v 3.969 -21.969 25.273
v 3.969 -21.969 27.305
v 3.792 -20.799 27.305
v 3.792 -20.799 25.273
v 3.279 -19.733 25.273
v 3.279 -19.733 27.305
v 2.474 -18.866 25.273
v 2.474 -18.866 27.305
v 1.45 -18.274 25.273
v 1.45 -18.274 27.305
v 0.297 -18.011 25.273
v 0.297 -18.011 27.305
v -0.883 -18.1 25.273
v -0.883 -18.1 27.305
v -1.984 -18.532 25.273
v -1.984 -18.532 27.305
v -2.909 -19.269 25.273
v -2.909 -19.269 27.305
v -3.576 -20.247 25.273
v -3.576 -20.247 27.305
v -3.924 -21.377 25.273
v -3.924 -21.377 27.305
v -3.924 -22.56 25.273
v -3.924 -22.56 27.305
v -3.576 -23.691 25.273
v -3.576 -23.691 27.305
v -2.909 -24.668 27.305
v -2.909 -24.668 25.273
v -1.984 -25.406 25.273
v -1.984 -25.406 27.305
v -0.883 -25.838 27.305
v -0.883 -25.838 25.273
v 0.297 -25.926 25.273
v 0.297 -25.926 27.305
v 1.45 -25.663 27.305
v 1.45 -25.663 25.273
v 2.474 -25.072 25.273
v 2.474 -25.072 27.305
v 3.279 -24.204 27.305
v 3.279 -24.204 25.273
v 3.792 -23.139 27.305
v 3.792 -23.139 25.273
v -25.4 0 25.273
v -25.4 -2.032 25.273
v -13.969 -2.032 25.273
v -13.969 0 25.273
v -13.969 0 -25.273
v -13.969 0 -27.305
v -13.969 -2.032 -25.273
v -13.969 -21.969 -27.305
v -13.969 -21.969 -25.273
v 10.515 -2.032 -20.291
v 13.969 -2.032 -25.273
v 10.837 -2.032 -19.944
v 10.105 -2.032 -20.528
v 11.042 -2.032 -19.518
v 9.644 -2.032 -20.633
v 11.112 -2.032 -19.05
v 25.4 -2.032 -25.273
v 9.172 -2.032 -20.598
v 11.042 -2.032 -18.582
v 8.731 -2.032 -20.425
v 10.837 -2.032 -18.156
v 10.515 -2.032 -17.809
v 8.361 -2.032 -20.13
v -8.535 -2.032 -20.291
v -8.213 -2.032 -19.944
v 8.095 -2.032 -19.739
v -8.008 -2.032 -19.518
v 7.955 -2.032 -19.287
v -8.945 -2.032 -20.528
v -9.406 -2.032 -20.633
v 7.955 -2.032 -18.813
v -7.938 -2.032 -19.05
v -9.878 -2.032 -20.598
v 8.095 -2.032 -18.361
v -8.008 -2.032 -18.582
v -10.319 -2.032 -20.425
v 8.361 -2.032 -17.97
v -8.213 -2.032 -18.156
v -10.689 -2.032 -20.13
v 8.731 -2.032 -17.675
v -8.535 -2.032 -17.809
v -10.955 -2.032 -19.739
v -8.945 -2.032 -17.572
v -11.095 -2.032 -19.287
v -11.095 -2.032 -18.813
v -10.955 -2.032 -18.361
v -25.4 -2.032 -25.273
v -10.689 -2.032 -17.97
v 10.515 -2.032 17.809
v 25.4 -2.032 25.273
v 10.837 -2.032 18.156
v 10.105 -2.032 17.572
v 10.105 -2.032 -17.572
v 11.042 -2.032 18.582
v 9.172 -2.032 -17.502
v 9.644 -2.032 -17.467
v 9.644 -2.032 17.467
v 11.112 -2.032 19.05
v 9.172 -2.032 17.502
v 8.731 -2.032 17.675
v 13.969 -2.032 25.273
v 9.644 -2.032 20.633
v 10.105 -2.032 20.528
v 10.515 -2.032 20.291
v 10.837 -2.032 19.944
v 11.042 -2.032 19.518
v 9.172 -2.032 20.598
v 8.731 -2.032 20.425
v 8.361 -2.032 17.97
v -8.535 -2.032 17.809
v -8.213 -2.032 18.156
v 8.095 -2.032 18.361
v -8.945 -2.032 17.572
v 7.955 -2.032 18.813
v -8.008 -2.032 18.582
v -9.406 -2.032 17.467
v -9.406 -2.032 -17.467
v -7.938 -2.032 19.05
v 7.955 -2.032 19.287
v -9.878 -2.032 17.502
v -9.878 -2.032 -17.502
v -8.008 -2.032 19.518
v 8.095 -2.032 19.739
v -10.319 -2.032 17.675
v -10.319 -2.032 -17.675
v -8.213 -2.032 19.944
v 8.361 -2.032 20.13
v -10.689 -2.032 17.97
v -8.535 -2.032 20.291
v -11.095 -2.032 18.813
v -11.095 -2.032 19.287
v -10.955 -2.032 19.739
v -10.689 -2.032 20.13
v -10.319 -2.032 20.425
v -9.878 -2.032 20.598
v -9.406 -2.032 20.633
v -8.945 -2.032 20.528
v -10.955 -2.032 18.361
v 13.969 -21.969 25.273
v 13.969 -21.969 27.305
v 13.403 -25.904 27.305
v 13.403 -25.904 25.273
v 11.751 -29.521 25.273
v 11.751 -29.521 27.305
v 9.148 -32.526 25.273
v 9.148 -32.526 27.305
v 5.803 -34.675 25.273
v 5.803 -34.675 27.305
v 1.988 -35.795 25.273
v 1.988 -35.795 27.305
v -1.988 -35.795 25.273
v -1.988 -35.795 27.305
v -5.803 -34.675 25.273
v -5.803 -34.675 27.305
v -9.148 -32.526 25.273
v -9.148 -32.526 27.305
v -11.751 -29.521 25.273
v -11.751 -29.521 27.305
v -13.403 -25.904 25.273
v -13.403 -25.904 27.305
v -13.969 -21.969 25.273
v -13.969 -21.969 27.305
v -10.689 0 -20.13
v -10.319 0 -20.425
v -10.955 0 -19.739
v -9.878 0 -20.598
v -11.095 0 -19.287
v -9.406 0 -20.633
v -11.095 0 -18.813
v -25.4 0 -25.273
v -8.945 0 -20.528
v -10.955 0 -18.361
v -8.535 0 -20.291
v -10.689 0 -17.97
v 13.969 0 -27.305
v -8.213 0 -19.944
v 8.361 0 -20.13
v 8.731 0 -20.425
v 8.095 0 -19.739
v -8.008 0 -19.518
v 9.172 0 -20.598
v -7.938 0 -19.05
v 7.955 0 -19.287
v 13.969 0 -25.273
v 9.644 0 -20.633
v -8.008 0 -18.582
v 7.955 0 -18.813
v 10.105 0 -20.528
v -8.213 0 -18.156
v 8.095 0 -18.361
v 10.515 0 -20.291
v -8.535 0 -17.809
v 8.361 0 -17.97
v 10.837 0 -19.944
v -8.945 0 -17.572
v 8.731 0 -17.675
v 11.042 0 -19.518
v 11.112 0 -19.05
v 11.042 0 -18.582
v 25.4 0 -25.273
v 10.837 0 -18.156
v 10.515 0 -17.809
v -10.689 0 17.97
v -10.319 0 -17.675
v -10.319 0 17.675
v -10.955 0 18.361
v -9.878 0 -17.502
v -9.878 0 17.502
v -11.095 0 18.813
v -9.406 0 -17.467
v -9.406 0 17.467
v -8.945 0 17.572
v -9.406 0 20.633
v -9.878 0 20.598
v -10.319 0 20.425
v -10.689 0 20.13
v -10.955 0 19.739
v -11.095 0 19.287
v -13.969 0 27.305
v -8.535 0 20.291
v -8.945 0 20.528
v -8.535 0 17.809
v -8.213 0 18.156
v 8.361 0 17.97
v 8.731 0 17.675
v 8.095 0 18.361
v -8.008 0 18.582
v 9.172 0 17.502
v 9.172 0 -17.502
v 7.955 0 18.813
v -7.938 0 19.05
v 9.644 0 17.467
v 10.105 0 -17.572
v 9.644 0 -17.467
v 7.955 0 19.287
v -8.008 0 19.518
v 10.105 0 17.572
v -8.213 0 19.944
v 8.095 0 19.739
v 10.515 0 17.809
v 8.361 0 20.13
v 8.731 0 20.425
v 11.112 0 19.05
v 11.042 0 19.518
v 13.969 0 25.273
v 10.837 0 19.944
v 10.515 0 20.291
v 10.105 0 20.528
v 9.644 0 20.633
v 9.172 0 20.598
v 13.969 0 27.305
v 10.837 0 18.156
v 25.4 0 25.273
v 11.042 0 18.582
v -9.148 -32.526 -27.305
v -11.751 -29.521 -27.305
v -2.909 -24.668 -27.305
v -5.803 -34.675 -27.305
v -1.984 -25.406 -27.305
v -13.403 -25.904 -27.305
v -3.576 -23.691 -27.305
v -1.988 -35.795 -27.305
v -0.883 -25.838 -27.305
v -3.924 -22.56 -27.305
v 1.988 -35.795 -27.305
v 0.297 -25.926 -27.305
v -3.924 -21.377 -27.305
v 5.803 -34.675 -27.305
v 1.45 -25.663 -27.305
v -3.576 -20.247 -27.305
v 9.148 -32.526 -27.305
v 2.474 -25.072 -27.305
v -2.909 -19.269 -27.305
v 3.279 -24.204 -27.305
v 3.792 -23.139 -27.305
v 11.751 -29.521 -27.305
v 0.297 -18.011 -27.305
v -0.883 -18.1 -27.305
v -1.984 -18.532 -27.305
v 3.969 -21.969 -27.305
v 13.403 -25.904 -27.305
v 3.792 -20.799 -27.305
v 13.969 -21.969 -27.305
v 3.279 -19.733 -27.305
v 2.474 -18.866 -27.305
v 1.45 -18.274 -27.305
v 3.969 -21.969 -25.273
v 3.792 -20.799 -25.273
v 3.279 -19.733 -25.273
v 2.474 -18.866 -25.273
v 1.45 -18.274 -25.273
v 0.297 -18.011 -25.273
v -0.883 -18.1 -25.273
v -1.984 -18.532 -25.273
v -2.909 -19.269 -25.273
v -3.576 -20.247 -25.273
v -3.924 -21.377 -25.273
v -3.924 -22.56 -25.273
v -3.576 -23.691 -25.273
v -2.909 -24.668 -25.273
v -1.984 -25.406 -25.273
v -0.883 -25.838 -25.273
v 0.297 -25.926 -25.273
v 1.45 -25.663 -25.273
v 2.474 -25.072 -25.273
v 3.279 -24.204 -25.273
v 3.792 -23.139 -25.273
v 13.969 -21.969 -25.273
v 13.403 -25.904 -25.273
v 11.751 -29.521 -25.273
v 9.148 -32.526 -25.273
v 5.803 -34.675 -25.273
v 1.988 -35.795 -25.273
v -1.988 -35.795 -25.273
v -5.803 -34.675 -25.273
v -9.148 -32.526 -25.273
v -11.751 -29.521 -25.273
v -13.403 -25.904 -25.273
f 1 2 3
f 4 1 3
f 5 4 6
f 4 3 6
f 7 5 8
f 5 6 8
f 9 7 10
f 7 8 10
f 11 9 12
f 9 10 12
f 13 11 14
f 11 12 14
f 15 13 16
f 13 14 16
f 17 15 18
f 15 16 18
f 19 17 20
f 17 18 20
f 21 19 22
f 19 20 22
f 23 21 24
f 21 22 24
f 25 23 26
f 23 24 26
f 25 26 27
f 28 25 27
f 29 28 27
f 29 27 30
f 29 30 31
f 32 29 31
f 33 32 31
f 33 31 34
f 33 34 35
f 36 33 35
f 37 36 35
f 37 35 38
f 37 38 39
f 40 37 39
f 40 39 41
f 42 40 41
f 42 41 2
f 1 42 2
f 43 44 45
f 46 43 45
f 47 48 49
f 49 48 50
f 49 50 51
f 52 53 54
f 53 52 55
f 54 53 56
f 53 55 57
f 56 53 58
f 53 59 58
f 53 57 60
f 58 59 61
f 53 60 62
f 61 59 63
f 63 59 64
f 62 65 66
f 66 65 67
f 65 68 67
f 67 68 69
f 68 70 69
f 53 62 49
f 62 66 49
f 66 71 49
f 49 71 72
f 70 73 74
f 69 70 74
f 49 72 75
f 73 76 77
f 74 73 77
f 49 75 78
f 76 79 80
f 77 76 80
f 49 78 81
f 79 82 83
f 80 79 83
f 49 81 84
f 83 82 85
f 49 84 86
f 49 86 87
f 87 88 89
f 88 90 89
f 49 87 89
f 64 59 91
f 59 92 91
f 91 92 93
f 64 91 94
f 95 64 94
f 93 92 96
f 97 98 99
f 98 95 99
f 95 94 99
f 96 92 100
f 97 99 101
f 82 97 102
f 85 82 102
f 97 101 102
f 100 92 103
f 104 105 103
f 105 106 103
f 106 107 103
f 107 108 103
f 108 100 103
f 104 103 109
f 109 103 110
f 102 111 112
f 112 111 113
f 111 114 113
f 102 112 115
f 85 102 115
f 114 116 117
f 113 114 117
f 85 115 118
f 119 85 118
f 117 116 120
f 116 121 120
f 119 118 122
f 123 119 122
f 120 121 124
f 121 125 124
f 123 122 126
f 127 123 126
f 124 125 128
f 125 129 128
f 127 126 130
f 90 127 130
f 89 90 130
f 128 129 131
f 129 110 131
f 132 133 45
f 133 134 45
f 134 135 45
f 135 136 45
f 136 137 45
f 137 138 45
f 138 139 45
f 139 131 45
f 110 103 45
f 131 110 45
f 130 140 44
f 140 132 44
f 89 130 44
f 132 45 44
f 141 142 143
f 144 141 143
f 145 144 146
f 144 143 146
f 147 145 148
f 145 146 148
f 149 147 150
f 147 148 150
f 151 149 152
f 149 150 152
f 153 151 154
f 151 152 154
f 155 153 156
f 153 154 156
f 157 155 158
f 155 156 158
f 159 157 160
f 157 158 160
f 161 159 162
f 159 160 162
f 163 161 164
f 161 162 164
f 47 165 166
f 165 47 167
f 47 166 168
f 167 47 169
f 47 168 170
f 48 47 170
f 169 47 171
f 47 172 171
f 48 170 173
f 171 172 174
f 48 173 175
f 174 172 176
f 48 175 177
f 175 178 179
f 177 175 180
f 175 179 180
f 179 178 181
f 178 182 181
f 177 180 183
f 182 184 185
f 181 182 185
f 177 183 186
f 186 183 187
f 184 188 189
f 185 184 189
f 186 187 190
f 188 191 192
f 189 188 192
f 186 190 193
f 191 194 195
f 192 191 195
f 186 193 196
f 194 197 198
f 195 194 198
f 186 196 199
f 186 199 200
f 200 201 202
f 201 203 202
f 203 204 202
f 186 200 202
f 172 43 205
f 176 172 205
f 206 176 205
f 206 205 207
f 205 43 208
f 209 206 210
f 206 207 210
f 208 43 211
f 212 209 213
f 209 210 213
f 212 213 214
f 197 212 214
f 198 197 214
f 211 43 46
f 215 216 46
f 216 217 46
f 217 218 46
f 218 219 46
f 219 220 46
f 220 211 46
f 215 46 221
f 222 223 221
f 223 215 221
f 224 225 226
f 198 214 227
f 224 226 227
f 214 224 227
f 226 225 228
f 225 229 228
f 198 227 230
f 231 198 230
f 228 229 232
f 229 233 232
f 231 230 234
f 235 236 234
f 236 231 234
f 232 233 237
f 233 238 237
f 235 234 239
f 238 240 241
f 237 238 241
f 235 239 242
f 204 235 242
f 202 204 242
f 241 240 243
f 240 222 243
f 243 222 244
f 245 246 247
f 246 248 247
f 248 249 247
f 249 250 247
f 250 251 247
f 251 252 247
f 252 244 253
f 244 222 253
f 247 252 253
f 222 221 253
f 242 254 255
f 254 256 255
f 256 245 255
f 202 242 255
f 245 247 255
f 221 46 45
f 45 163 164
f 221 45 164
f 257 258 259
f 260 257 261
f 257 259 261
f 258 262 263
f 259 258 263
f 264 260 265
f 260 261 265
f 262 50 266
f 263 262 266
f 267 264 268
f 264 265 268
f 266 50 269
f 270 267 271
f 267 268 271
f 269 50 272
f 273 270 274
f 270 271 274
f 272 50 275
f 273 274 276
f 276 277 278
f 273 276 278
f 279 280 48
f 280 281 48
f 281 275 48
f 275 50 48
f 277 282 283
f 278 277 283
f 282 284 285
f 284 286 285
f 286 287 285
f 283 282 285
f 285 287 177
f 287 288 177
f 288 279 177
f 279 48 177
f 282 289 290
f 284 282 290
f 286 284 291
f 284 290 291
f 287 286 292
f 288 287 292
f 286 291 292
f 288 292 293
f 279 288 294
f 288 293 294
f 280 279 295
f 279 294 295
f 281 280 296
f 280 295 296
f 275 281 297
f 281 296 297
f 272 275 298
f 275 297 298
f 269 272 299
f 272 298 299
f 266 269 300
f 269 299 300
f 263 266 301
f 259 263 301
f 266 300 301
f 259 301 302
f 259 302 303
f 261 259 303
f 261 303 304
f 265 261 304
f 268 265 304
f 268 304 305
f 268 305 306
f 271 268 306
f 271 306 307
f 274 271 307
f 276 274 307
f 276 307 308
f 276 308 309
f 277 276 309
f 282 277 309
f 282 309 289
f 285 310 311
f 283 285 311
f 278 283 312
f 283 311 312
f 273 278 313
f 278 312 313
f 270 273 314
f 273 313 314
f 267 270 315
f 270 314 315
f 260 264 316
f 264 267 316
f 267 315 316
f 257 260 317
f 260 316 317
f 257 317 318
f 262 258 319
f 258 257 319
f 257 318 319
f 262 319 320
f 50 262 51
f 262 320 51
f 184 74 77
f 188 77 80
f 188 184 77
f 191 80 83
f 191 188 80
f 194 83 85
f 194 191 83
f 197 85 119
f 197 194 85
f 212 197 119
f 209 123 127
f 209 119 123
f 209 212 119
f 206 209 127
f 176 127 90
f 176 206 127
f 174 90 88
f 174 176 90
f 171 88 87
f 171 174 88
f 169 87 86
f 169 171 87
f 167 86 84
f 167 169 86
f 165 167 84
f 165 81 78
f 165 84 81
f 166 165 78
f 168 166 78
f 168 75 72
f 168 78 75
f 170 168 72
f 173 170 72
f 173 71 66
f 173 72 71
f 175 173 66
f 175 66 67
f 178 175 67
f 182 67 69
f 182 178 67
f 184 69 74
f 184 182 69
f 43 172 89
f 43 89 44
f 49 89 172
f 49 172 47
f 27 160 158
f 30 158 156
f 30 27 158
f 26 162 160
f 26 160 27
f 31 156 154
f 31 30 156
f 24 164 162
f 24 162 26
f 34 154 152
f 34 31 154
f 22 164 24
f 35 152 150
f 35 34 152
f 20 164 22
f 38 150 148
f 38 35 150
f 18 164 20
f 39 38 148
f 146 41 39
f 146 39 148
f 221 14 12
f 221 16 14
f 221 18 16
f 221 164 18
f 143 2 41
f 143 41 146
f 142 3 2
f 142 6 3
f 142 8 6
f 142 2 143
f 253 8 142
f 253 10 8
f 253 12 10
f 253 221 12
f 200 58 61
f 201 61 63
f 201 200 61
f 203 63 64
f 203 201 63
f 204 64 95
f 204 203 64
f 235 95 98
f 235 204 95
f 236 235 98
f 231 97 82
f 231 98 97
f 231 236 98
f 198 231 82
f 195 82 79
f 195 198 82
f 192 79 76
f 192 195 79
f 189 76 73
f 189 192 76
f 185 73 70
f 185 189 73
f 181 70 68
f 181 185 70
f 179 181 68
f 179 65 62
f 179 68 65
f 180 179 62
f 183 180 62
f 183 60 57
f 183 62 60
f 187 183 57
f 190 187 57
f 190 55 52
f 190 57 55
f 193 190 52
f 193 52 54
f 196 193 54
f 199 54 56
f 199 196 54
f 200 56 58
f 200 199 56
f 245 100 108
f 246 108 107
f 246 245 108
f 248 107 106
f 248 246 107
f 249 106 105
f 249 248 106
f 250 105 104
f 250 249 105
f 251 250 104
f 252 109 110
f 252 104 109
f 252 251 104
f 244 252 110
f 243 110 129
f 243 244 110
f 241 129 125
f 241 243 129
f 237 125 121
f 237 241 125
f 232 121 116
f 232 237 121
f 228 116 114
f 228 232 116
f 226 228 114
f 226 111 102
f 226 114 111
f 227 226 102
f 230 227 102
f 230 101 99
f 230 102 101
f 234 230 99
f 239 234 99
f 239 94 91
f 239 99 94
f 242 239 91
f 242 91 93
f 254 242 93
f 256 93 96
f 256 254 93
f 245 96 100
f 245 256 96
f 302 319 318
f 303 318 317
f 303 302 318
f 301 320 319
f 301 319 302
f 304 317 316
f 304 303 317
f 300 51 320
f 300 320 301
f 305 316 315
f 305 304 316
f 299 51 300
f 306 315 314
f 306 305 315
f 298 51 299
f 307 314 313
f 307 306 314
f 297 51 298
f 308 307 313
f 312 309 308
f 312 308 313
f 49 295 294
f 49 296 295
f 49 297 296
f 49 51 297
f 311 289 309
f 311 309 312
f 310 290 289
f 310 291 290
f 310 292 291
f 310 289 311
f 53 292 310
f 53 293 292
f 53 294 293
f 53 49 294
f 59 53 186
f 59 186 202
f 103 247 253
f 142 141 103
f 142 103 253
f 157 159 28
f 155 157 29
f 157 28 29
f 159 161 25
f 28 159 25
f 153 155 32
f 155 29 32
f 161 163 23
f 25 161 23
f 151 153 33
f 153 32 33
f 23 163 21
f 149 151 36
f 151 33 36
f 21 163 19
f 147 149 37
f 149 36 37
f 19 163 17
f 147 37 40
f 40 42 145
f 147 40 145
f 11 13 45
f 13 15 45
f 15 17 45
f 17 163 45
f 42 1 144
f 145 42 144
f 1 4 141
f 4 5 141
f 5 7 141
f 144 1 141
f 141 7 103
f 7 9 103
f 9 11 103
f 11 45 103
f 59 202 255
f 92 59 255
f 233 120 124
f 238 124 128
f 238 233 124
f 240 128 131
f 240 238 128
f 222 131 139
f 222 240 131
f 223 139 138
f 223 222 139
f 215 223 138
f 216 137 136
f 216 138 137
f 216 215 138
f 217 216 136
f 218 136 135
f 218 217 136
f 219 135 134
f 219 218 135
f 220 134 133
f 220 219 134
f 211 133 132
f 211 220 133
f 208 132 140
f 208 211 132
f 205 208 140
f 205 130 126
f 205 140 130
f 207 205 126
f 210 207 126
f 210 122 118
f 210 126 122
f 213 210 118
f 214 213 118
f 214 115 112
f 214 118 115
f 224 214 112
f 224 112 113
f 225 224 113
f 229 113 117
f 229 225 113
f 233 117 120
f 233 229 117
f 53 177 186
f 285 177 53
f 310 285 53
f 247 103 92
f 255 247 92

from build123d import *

# Parameters (mm, degrees)
F0_W     = 50.8
F0_H     = 54.61
F0_R     = 1.5875
F1_DEPTH = 50.8
F2_R     = 3.96875
F3_DEPTH = 54.611
F4_W     = 50.8
F4_H     = 50.546
F5_DEPTH = 33.9065
F6_W     = 11.43125
F6_H     = 2.032
F7_DEPTH = 2.033


with BuildPart() as f1:
    # F0 (on Front) → F1 (new body)
    with BuildSketch(Plane.XZ):
        Rectangle(F0_W, F0_H)
        with Locations((-9.525, -19.05)):
            Circle(F0_R, mode=Mode.SUBTRACT)
        with Locations((9.525, -19.05)):
            Circle(F0_R, mode=Mode.SUBTRACT)
        with Locations((-9.525, 19.05)):
            Circle(F0_R, mode=Mode.SUBTRACT)
        with Locations((9.525, 19.05)):
            Circle(F0_R, mode=Mode.SUBTRACT)
    extrude(amount=F1_DEPTH)

    # F2 (on face) → F3 (cut, through all)
    with BuildSketch(Plane.XY.offset(27.305)):
        with BuildLine():
            Line((-25.4, -2.032), (-25.4, -50.8))
            Line((-25.4, -50.8), (25.4, -50.8))
            Line((25.4, -50.8), (25.4, -2.032))
            Line((25.4, -2.032), (13.96875, -2.032))
            Line((13.96875, -2.032), (13.96875, -21.96875))
            ThreePointArc((13.96875, -21.96875), (0, -35.9375), (-13.96875, -21.96875))
            Line((-13.96875, -21.96875), (-13.96875, -2.032))
            Line((-13.96875, -2.032), (-25.4, -2.032))
        make_face()
        with Locations((0, -21.96875)):
            Circle(F2_R)
    extrude(amount=-F3_DEPTH, mode=Mode.SUBTRACT)

    # F4 (on face) → F5 (cut, through all)
    with BuildSketch(Plane.XZ.offset(2.032)):
        Rectangle(F4_W, F4_H)
    extrude(amount=F5_DEPTH, mode=Mode.SUBTRACT)

    # F6 (on face) → F7 (cut, through all)
    with BuildSketch(Plane.XZ.offset(2.032)):
        with Locations((-19.684375, 26.289)):
            Rectangle(F6_W, F6_H)
        with Locations((19.684375, 26.289)):
            Rectangle(F6_W, F6_H)
        with Locations((19.684375, -26.289)):
            Rectangle(F6_W, F6_H)
        with Locations((-19.684375, -26.289)):
            Rectangle(F6_W, F6_H)
    extrude(amount=-F7_DEPTH, mode=Mode.SUBTRACT)


solid = f1.part
